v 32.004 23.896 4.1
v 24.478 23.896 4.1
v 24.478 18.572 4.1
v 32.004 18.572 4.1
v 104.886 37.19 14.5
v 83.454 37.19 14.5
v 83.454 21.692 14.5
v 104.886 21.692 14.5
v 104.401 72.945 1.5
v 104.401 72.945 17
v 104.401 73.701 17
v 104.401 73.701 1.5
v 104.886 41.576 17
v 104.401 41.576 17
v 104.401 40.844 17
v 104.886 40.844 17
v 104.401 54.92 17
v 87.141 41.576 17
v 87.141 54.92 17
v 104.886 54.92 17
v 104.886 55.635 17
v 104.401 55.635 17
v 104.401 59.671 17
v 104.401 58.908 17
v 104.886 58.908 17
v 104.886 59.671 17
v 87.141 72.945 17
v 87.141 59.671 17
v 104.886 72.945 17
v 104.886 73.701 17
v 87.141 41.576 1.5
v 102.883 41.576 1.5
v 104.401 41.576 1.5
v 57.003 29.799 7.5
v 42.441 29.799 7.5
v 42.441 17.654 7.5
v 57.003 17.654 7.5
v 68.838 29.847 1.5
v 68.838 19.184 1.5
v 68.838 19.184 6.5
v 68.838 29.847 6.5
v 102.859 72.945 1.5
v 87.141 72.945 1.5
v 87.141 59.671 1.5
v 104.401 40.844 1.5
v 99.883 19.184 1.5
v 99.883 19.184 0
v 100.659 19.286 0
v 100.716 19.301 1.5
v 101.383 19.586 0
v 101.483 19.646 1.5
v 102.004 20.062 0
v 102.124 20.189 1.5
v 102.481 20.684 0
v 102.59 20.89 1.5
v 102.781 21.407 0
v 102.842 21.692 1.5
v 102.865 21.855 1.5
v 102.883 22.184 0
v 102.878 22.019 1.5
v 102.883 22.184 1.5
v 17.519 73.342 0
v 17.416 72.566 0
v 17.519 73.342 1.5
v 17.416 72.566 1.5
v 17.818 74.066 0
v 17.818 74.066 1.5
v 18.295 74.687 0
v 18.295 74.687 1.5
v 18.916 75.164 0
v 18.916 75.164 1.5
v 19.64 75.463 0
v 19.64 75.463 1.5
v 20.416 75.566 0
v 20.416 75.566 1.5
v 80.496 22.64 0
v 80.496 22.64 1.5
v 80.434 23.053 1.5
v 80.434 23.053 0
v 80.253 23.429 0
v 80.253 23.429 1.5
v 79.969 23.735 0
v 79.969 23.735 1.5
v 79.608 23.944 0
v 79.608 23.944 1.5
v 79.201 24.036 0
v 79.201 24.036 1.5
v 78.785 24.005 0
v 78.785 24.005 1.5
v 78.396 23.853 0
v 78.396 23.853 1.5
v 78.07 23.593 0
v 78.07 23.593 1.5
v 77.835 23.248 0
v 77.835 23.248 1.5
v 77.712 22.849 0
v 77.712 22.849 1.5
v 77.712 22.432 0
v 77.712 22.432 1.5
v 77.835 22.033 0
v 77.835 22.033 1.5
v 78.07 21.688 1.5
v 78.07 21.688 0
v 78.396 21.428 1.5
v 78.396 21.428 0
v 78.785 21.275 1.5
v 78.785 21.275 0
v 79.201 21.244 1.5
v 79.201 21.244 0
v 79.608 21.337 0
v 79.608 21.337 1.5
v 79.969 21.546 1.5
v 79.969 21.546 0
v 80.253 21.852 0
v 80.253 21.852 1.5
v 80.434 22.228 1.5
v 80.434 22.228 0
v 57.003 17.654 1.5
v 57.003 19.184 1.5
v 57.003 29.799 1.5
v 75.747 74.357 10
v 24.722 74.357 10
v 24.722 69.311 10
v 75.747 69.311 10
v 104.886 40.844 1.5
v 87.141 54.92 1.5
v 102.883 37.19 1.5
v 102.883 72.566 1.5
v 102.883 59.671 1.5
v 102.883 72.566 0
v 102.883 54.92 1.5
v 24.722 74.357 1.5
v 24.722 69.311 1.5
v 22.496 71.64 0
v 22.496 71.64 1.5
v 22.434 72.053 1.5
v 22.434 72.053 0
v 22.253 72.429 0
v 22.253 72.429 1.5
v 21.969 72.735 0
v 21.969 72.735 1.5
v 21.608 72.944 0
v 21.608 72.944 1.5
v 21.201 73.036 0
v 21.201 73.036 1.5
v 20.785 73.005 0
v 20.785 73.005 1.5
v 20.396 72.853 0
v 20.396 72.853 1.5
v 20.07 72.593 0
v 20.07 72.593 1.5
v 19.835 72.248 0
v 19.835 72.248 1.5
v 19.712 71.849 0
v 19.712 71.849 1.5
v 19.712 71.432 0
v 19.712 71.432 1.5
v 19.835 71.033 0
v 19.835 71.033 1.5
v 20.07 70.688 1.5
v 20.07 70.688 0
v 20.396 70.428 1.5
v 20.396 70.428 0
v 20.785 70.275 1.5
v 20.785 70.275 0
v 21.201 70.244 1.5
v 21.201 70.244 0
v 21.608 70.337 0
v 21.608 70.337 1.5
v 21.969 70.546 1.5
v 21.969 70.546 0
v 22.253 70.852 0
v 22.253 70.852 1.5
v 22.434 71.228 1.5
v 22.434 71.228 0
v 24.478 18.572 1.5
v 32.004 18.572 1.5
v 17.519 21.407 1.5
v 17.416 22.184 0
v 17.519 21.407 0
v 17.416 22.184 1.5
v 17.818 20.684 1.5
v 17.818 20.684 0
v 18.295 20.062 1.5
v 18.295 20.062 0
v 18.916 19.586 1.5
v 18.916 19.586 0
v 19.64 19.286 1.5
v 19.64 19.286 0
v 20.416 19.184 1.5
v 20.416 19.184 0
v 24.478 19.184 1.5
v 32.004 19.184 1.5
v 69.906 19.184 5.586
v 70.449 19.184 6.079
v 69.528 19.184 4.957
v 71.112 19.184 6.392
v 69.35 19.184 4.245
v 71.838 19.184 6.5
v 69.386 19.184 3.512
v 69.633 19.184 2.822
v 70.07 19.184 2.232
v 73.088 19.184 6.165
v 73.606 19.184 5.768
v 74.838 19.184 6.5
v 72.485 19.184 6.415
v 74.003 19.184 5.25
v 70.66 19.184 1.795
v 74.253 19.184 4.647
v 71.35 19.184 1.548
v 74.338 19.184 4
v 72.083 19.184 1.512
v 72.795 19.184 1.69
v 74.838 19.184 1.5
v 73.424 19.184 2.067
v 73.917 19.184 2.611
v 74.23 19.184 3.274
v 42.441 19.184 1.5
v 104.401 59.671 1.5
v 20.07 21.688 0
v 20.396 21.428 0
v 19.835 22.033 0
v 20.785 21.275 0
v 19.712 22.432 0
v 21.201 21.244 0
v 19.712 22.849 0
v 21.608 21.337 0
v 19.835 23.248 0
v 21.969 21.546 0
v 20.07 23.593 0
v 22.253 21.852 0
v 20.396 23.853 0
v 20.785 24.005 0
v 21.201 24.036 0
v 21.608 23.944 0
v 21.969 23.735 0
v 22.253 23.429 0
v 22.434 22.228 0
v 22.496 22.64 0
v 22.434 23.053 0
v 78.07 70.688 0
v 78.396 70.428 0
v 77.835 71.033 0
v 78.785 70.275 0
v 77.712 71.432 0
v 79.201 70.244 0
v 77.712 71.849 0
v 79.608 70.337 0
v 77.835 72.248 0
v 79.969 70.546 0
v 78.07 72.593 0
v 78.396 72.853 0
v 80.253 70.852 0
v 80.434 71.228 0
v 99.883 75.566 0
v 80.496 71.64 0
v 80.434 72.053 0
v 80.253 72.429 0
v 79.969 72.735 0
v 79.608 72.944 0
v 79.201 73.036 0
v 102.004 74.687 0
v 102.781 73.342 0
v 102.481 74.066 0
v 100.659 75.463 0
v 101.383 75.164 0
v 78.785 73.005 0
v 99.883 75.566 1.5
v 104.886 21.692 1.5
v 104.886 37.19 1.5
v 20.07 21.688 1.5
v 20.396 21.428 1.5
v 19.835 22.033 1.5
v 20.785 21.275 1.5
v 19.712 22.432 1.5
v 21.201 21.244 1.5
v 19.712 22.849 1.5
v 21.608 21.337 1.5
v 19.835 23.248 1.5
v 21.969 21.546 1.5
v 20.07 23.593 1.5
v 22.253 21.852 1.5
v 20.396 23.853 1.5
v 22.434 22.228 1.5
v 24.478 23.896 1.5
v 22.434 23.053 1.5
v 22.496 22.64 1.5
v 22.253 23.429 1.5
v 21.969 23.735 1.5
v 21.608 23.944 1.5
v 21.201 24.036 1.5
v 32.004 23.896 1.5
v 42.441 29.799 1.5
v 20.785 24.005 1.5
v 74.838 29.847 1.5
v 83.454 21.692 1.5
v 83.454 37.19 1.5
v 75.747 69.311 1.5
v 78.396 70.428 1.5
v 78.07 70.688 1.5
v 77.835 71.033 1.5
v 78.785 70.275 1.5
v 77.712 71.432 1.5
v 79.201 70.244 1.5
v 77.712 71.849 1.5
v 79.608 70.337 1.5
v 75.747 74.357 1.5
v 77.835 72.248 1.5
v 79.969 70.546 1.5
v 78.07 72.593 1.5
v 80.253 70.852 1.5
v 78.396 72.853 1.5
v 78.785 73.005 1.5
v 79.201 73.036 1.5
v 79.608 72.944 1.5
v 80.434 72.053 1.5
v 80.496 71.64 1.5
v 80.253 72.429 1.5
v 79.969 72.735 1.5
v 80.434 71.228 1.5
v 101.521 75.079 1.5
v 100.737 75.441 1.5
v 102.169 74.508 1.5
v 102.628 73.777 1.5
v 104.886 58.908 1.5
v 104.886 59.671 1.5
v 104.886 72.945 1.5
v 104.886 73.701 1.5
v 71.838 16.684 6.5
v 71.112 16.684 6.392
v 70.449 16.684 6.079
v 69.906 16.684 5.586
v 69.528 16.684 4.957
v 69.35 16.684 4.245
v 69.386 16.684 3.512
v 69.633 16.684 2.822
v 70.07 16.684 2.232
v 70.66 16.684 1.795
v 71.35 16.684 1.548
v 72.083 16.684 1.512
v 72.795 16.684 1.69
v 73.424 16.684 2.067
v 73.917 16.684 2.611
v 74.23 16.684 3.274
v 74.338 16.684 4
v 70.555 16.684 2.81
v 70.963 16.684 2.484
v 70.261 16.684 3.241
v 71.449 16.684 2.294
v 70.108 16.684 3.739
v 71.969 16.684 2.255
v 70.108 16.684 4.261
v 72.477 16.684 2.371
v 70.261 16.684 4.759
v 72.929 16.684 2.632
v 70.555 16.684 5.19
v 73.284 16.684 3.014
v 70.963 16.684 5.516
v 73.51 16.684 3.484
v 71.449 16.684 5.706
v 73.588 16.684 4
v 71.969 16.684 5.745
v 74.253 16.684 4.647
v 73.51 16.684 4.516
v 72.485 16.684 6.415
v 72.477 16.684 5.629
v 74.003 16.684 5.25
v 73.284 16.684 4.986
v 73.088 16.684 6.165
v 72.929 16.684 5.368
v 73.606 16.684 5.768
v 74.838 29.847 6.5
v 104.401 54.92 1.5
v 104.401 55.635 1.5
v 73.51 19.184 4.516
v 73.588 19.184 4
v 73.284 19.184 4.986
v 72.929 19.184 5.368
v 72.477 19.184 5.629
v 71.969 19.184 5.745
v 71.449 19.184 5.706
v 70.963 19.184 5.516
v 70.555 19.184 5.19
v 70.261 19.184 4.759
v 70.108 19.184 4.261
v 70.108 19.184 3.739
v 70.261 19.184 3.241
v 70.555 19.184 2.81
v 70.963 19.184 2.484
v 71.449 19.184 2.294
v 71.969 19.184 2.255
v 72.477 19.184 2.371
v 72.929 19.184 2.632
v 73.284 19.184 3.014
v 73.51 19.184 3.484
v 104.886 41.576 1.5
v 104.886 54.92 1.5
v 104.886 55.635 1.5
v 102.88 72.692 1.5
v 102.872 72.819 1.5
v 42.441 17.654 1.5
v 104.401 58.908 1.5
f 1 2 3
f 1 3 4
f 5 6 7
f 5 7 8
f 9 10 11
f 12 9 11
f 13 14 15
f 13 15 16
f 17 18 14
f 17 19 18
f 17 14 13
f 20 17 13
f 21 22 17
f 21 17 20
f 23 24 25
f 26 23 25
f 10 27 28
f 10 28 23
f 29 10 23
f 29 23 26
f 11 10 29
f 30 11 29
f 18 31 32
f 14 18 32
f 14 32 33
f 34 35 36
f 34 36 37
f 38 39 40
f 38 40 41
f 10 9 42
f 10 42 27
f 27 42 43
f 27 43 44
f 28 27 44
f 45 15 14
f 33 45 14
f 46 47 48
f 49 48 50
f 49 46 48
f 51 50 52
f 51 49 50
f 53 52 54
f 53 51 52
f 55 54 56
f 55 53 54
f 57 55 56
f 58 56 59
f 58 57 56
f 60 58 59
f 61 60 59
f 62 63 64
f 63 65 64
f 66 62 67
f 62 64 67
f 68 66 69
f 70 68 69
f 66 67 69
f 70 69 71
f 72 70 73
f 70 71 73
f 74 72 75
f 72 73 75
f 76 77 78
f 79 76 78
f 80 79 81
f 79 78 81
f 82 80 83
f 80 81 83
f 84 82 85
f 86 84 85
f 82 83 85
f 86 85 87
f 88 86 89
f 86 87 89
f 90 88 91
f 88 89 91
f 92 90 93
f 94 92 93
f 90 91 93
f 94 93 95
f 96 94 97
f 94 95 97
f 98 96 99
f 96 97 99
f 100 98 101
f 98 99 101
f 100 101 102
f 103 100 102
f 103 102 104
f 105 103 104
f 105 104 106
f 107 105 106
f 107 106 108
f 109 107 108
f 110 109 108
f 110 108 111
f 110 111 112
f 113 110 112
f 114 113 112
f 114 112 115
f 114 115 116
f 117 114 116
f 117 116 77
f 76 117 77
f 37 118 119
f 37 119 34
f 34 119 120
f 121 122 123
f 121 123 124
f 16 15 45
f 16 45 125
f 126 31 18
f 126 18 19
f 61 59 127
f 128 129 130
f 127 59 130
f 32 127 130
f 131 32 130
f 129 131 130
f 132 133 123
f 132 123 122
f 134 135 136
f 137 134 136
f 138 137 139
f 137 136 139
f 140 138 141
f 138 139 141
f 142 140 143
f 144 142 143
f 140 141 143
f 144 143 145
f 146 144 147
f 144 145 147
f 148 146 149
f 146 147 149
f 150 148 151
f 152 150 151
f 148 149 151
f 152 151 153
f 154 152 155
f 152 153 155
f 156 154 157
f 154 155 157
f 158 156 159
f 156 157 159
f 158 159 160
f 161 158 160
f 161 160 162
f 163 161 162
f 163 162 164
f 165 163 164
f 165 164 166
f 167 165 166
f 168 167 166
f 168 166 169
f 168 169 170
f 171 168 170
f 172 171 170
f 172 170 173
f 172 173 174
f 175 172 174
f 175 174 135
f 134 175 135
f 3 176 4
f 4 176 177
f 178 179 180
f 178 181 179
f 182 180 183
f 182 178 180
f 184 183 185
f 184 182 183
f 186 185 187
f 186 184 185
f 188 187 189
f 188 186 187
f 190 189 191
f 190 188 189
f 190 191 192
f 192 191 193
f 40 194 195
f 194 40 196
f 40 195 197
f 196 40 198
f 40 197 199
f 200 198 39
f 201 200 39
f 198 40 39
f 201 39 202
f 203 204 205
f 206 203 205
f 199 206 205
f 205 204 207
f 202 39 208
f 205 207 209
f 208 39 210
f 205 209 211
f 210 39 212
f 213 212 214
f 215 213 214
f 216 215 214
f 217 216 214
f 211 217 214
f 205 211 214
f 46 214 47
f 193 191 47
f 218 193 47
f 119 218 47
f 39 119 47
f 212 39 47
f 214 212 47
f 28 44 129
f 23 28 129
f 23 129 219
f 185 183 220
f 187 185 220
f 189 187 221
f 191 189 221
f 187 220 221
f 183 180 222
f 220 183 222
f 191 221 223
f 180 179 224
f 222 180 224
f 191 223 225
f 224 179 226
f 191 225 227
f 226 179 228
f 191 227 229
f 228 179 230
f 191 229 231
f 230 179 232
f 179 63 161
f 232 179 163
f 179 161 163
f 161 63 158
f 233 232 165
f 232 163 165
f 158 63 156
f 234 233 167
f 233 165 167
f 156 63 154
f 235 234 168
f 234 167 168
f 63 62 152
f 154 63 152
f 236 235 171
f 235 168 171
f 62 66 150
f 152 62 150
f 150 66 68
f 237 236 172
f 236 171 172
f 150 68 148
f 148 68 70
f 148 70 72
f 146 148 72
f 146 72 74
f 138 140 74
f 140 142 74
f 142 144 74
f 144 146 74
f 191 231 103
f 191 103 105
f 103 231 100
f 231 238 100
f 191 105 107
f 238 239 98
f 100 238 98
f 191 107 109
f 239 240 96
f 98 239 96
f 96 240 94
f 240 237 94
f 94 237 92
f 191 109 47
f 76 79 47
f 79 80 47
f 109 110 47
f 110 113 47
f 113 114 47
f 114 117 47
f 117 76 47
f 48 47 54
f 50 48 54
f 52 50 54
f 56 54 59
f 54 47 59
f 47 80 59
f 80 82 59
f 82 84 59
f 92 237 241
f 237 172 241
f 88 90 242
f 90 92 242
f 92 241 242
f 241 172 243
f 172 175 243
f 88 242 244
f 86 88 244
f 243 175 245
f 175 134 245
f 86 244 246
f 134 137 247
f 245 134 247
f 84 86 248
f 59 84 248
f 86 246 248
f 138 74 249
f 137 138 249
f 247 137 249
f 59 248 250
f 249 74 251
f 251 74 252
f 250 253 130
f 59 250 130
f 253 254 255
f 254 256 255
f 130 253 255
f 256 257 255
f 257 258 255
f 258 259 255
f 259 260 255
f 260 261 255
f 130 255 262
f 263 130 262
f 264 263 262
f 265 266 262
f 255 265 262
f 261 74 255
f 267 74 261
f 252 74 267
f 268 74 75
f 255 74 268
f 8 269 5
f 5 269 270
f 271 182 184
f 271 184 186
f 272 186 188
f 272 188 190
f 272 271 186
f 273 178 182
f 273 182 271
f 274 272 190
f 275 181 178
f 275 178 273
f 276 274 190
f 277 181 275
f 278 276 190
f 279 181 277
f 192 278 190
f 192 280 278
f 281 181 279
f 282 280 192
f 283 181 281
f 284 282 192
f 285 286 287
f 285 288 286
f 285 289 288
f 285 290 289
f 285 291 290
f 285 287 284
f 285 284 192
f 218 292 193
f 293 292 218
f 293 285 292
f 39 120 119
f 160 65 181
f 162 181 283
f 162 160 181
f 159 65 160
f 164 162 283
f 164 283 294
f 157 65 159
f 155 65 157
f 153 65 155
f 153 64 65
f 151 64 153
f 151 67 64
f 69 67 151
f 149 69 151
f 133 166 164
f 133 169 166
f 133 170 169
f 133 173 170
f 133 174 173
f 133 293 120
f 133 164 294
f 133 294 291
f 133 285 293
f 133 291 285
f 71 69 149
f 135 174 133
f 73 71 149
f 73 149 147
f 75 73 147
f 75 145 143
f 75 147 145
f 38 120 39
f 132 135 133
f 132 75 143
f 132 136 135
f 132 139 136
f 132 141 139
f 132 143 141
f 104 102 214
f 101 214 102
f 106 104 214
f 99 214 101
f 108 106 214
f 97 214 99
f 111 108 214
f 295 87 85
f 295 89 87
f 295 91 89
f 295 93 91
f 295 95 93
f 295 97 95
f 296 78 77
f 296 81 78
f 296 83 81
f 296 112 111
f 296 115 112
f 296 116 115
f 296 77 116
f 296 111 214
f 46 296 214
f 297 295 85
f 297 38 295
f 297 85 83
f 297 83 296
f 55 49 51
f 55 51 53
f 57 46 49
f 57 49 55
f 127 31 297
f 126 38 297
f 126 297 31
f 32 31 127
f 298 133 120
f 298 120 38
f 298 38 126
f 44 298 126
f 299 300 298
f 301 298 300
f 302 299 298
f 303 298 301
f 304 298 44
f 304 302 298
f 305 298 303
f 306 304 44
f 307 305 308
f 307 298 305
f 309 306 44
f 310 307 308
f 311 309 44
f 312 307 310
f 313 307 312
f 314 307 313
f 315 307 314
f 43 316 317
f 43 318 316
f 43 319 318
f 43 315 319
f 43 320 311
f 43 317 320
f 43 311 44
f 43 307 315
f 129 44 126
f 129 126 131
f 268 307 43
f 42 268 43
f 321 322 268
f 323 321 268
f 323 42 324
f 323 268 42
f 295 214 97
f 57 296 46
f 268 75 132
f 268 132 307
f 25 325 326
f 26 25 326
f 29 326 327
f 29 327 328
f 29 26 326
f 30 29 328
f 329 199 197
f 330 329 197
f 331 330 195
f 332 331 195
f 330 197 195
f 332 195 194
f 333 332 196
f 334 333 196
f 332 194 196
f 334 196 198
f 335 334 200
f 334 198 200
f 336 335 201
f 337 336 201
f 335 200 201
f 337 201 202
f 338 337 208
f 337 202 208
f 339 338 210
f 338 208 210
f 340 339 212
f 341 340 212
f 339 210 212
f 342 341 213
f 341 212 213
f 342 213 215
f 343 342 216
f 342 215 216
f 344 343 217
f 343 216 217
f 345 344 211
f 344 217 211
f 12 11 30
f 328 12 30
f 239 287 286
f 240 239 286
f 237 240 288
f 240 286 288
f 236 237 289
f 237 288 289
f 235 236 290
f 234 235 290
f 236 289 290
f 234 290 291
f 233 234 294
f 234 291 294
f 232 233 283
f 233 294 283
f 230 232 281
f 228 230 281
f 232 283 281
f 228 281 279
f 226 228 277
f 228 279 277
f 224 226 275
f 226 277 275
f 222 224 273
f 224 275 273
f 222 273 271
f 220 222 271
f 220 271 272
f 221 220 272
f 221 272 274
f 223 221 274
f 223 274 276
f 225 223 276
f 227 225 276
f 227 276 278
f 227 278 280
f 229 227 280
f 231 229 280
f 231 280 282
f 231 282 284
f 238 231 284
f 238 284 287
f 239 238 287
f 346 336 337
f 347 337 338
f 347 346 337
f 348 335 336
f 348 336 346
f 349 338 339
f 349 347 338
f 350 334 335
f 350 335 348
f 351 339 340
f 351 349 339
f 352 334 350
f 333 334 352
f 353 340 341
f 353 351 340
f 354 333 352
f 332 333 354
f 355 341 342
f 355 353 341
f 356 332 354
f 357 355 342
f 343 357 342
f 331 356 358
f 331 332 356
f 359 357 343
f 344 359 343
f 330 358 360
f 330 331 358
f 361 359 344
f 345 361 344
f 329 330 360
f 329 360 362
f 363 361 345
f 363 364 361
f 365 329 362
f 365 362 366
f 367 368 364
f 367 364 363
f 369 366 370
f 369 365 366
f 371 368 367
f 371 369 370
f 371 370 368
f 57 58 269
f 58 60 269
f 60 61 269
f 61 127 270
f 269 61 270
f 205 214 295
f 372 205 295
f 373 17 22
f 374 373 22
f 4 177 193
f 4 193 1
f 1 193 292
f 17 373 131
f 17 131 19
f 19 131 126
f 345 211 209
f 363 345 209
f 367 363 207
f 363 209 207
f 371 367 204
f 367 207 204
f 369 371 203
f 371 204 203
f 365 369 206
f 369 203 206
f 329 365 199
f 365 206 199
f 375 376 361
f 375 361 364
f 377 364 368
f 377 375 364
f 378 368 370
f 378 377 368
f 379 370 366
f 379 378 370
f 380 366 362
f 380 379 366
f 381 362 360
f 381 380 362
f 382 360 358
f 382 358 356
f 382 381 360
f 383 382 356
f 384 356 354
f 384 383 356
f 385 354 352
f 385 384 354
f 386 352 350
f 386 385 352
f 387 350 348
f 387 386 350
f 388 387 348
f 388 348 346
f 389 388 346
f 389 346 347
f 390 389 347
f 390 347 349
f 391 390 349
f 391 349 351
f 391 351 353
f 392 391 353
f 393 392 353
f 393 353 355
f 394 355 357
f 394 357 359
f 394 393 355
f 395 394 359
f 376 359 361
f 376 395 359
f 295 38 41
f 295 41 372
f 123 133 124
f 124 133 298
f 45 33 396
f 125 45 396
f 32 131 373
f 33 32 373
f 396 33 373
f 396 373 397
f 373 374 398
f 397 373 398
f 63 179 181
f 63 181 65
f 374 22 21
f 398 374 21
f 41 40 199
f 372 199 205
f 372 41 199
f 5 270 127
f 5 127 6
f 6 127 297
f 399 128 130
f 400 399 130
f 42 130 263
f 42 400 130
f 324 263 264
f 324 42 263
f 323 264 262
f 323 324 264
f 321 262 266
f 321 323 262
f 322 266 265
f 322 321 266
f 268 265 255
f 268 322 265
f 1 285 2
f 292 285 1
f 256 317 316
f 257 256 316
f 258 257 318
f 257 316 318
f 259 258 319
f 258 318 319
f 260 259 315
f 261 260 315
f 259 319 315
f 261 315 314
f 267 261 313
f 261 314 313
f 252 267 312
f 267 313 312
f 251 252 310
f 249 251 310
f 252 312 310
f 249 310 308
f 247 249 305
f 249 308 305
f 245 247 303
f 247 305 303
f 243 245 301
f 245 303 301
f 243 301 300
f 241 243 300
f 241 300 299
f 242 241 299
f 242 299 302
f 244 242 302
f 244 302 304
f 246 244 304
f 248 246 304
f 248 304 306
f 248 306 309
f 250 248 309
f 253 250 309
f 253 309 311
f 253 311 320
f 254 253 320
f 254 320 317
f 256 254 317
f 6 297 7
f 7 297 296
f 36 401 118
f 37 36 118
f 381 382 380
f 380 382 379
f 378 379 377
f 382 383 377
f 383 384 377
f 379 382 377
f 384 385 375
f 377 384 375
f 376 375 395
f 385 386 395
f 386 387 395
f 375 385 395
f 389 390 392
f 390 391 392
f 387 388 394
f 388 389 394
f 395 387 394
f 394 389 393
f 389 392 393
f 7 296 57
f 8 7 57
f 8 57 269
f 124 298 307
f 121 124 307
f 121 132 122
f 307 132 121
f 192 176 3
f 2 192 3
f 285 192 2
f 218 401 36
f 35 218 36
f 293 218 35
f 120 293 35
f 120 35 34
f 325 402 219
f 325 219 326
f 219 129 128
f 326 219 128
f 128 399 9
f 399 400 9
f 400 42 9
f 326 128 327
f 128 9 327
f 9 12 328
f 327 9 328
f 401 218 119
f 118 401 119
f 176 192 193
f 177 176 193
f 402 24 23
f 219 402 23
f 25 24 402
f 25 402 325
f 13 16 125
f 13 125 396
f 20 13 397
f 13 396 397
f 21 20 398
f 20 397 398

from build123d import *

# Parameters (mm, degrees)
F0_W      = 85.4666158557
F0_H      = 56.3820376992
F1_DEPTH  = 1.5
F2_R      = 3
F3_W      = 51.0251373053
F3_H      = 5.0469487906
F4_DEPTH  = 8.5
F5_W      = 2.0034983754
F5_H      = 13.3438147604
F5_W_2    = 15.7416835427
F6_DEPTH  = 15.5
F7_DEPTH  = 13
F8_W      = 0.4854053259
F8_H      = 14.7926211357
F8_H_2    = 14.7911831737
F9_DEPTH  = 15.5
F10_W     = 14.5616829395
F10_H     = 12.1452622116
F11_DEPTH = 6
F12_W     = 6
F12_H     = 10.663215287
F13_DEPTH = 5
F14_R     = 1.75
F15_DEPTH = 2.5
F16_W     = 7.5255241245
F16_H     = 5.3236111999
F17_DEPTH = 2.6
F18_R     = 1.4
F19_DEPTH = 25


with BuildPart() as f1:
    # F0 (on Top) → F1 (new body)
    with BuildSketch(Plane.XY):
        with Locations((60.1496808231, 47.3746545613)):
            Rectangle(F0_W, F0_H)
    extrude(amount=F1_DEPTH)

    # F2
    f2_edges = [f1.edges().sort_by_distance(p)[0] for p in [
        (102.882989, 75.565673, 0.75),
        (17.416373, 75.565673, 0.75),
        (17.416373, 19.183636, 0.75),
        (102.882989, 19.183636, 0.75),
    ]]
    fillet(f2_edges, radius=F2_R)

    # F3 (on face) → F4 (join)
    with BuildSketch(Plane.XY.offset(1.5)):
        with Locations((50.2348765731, 71.8340054154)):
            Rectangle(F3_W, F3_H)
    extrude(amount=F4_DEPTH)

    # F5 (on face) → F6 (join)
    with BuildSketch(Plane.XY.offset(1.5)):
        with Locations((103.8847379386, 48.2480246574)):
            Rectangle(F5_W, F5_H)
        with Locations((95.0121469796, 48.2480246574)):
            Rectangle(F5_W_2, F5_H)
        with BuildLine():
            Line((104.8864871264, 72.9445666075), (102.8589658922, 72.9445666075))
            ThreePointArc((102.8589658922, 72.9445666075), (102.8769770128, 72.7555004059), (102.8829887509, 72.5656734109))
            Line((102.8829887509, 72.5656734109), (102.8829887509, 59.670612216))
            Line((102.8829887509, 59.670612216), (104.8864871264, 59.670612216))
            Line((104.8864871264, 59.670612216), (104.8864871264, 72.9445666075))
        make_face()
        with BuildLine():
            Line((102.8589658922, 72.9445666075), (87.1413052082, 72.9445666075))
            Line((87.1413052082, 72.9445666075), (87.1413052082, 59.670612216))
            Line((87.1413052082, 59.670612216), (102.8829887509, 59.670612216))
            Line((102.8829887509, 59.670612216), (102.8829887509, 72.5656734109))
            ThreePointArc((102.8829887509, 72.5656734109), (102.8769770128, 72.7555004059), (102.8589658922, 72.9445666075))
        make_face()
    extrude(amount=F6_DEPTH)

    # F5 (on face) → F7 (join)
    with BuildSketch(Plane.XY.offset(1.5)):
        with BuildLine():
            Line((102.8829887509, 22.1836357117), (102.8829887509, 37.1904186904))
            Line((102.8829887509, 37.1904186904), (83.4540203214, 37.1904186904))
            Line((83.4540203214, 37.1904186904), (83.4540203214, 21.6917544603))
            Line((83.4540203214, 21.6917544603), (102.8423895069, 21.6917544603))
            ThreePointArc((102.8423895069, 21.6917544603), (102.8728217118, 21.9368587557), (102.8829887509, 22.1836357117))
        make_face()
        with BuildLine():
            Line((104.8864871264, 37.1904186904), (102.8829887509, 37.1904186904))
            Line((102.8829887509, 37.1904186904), (102.8829887509, 22.1836357117))
            ThreePointArc((102.8829887509, 22.1836357117), (102.8728217118, 21.9368587557), (102.8423895069, 21.6917544603))
            Line((102.8423895069, 21.6917544603), (104.8864871264, 21.6917544603))
            Line((104.8864871264, 21.6917544603), (104.8864871264, 37.1904186904))
        make_face()
    extrude(amount=F7_DEPTH)

    # F8 (on face) → F9 (join)
    with BuildSketch(Plane.XY.offset(17)):
        with Locations((104.6437844634, 66.3045793772)):
            Rectangle(F8_W, F8_H)
        with Locations((104.6437844634, 48.2392385602)):
            Rectangle(F8_W, F8_H_2)
    extrude(amount=-F9_DEPTH)

    # F10 (on face) → F11 (join)
    with BuildSketch(Plane.XY.offset(1.5)):
        with Locations((49.7219525278, 23.7262044102)):
            Rectangle(F10_W, F10_H)
    extrude(amount=F11_DEPTH)

    # F12 (on face) → F13 (join)
    with BuildSketch(Plane.XY.offset(1.5)):
        with Locations((71.8380571604, 24.5152433552)):
            Rectangle(F12_W, F12_H)
    extrude(amount=F13_DEPTH)

    # F14 (on face) → F15 (join)
    with BuildSketch(Plane.XZ.offset(-19.1836357117)):
        with BuildLine():
            ThreePointArc((71.8380571604, 6.5), (70.0702902074, 2.232233047), (74.3380571604, 4))
            ThreePointArc((74.3380571604, 4), (73.6058241133, 5.767766953), (71.8380571604, 6.5))
        make_face()
        with Locations((71.8380571604, 4)):
            Circle(F14_R, mode=Mode.SUBTRACT)
    extrude(amount=F15_DEPTH)

    # F16 (on face) → F17 (join)
    with BuildSketch(Plane.XY.offset(1.5)):
        with Locations((28.2411361113, 21.2340727448)):
            Rectangle(F16_W, F16_H)
    extrude(amount=F17_DEPTH)

    # F18 (on face) → F19 (cut)
    with BuildSketch(Plane.XY.offset(1.5)):
        with Locations((79.0960954428, 71.6403754205)):
            Circle(F18_R)
        with Locations((79.0960954428, 22.6403754205)):
            Circle(F18_R)
        with Locations((21.0960954428, 22.6403754205)):
            Circle(F18_R)
        with Locations((21.0960954428, 71.6403754205)):
            Circle(F18_R)
    extrude(amount=-F19_DEPTH, mode=Mode.SUBTRACT)


solid = f1.part
